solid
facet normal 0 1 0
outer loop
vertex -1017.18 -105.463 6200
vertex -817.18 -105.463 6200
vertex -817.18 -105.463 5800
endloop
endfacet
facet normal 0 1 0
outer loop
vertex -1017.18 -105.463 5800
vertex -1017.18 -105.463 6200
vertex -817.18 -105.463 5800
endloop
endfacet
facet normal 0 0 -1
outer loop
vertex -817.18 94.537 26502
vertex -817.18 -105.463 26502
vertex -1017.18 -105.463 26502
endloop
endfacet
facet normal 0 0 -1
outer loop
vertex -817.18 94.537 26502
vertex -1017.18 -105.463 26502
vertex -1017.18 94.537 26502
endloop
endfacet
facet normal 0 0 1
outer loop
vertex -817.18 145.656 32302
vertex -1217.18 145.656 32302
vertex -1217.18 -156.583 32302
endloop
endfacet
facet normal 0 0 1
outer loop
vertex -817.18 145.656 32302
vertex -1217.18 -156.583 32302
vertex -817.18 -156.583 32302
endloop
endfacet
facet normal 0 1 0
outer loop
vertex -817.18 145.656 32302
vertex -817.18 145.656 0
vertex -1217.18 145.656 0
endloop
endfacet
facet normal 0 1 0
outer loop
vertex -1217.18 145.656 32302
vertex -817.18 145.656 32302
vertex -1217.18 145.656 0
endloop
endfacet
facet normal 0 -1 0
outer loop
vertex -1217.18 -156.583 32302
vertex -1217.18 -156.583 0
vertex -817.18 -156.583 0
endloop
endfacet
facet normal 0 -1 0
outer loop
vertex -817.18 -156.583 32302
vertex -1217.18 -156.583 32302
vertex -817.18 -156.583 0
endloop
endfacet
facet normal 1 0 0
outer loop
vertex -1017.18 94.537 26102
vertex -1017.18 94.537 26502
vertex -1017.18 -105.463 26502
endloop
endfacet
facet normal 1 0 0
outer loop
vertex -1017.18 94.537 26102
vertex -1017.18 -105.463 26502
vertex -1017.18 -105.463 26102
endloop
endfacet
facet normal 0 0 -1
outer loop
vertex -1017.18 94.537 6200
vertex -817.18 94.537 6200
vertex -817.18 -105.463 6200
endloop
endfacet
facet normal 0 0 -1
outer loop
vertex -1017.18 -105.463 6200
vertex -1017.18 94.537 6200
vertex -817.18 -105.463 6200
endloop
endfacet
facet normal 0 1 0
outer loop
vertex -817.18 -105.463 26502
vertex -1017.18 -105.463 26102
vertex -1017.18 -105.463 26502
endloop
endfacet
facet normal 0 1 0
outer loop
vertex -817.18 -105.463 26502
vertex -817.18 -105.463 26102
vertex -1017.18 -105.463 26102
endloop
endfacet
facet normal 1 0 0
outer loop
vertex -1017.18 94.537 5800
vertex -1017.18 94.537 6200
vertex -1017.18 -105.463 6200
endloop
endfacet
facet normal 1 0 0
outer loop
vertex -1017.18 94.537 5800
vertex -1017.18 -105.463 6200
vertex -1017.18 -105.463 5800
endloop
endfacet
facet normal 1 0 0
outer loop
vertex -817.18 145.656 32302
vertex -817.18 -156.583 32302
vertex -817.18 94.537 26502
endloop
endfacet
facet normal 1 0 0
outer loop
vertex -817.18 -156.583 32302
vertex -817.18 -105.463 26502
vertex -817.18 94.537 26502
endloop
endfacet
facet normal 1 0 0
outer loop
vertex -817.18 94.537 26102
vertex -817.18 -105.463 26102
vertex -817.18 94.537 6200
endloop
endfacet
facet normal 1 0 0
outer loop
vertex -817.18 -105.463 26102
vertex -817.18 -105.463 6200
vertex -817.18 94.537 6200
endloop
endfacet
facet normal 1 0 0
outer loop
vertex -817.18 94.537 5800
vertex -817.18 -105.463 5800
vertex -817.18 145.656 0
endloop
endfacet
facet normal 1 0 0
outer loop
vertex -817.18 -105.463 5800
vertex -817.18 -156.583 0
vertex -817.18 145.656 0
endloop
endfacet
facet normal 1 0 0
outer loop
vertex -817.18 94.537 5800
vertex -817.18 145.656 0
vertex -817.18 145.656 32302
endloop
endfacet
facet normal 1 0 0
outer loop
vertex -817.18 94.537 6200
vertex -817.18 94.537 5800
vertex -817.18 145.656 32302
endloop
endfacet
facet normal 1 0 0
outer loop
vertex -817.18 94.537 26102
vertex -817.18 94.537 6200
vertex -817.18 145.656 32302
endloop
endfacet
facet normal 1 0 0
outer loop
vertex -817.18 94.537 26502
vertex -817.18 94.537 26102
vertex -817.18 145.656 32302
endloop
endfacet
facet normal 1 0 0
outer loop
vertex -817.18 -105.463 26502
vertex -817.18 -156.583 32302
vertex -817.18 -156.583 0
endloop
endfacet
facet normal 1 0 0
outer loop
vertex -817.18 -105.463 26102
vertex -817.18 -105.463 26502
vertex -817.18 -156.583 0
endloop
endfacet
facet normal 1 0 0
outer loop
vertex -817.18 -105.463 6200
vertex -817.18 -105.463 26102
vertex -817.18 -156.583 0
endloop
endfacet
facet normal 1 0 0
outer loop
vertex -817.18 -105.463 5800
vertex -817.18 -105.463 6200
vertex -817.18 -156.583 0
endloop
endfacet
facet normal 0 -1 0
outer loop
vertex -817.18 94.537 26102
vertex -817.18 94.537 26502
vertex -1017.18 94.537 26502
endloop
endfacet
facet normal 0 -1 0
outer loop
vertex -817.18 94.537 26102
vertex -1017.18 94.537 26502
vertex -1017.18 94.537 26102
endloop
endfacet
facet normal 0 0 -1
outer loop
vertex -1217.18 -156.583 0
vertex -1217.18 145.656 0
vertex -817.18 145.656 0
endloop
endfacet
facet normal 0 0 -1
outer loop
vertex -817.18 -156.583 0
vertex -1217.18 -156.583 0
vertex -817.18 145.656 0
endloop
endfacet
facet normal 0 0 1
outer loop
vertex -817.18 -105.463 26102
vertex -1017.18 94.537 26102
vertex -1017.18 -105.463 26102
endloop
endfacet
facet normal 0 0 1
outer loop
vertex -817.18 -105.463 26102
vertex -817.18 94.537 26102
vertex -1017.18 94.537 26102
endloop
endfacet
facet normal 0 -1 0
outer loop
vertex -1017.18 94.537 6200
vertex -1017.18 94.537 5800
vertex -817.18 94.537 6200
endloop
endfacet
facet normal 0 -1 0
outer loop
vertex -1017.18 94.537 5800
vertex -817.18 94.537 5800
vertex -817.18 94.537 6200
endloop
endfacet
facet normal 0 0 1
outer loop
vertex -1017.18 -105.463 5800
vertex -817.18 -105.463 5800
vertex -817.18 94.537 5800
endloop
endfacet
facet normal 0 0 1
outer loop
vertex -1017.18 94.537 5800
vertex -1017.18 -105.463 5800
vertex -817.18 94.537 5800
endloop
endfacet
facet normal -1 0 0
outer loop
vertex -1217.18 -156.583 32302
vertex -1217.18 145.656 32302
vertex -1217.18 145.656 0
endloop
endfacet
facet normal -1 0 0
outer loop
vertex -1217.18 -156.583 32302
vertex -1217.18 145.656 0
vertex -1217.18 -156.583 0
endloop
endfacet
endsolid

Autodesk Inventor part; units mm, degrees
ref_plane "YZ Plane" through (0, 0, 0) normal (1, 0, 0) x (0, 1, 0)
ref_plane "XZ Plane" through (0, 0, 0) normal (0, 1, 0) x (-1, 0, 0)
ref_plane "XY Plane" through (0, 0, 0) normal (0, 0, 1) x (1, 0, 0)
sketch "Sketch1" plane through (0, 0, 0) normal (0, 0, 1) x (1, 0, 0)
  line L0 (-817.1803, 145.656) -> (-1217.1803, 145.656)
  line L1 (-1217.1803, 145.656) -> (-1217.1803, -156.5826)
  line L2 (-1217.1803, -156.5826) -> (-817.1803, -156.5826)
  line L3 (-817.1803, -156.5826) -> (-817.1803, 145.656)
  point P0 (0, 0)
  point P1 (-1217.1803, -156.5826)
  point P2 (782.8197, 145.656)
  point P3 (1182.8197, -156.5826)
extrude "Extrusion1" add sketch "Sketch1" along normal blind 32302
sketch "Sketch2" plane through (-817.1803, 145.656, 32302) normal (1, 0, 0) x (0, 0, -1)
  line L0 (6000, 0) -> (6000, -302.2386)
  line L1 (5800, -51.1193) -> (6200, -51.1193)
  line L2 (6200, -51.1193) -> (6200, -251.1193)
  line L3 (6200, -251.1193) -> (5800, -251.1193)
  line L4 (5800, -251.1193) -> (5800, -51.1193)
  line L5 (5800, -51.1193) -> (6200, -251.1193) construction
  line L6 (6200, -51.1193) -> (5800, -251.1193) construction
  line L7 (16151, 0) -> (16151, -447.3568)
  line L8 (26302, 0) -> (26302, -302.2386)
  line L9 (26502, -51.1193) -> (26102, -51.1193)
  line L10 (26102, -51.1193) -> (26102, -251.1193)
  line L11 (26102, -251.1193) -> (26502, -251.1193)
  line L12 (26502, -251.1193) -> (26502, -51.1193)
  line L13 (26502, -51.1193) -> (26102, -251.1193) construction
  line L14 (26102, -51.1193) -> (26502, -251.1193) construction
  point P0 (32302, -145.656)
  point P1 (0, 0)
  point P2 (6000, -151.1193)
  point P3 (26302, -151.1193)
  dimension "d3" = 400
  dimension "d4" = 200
extrude "Extrusion2" cut sketch "Sketch2" against normal blind 200
properties part number "support_frame_01" material "Wood (Maple)"
